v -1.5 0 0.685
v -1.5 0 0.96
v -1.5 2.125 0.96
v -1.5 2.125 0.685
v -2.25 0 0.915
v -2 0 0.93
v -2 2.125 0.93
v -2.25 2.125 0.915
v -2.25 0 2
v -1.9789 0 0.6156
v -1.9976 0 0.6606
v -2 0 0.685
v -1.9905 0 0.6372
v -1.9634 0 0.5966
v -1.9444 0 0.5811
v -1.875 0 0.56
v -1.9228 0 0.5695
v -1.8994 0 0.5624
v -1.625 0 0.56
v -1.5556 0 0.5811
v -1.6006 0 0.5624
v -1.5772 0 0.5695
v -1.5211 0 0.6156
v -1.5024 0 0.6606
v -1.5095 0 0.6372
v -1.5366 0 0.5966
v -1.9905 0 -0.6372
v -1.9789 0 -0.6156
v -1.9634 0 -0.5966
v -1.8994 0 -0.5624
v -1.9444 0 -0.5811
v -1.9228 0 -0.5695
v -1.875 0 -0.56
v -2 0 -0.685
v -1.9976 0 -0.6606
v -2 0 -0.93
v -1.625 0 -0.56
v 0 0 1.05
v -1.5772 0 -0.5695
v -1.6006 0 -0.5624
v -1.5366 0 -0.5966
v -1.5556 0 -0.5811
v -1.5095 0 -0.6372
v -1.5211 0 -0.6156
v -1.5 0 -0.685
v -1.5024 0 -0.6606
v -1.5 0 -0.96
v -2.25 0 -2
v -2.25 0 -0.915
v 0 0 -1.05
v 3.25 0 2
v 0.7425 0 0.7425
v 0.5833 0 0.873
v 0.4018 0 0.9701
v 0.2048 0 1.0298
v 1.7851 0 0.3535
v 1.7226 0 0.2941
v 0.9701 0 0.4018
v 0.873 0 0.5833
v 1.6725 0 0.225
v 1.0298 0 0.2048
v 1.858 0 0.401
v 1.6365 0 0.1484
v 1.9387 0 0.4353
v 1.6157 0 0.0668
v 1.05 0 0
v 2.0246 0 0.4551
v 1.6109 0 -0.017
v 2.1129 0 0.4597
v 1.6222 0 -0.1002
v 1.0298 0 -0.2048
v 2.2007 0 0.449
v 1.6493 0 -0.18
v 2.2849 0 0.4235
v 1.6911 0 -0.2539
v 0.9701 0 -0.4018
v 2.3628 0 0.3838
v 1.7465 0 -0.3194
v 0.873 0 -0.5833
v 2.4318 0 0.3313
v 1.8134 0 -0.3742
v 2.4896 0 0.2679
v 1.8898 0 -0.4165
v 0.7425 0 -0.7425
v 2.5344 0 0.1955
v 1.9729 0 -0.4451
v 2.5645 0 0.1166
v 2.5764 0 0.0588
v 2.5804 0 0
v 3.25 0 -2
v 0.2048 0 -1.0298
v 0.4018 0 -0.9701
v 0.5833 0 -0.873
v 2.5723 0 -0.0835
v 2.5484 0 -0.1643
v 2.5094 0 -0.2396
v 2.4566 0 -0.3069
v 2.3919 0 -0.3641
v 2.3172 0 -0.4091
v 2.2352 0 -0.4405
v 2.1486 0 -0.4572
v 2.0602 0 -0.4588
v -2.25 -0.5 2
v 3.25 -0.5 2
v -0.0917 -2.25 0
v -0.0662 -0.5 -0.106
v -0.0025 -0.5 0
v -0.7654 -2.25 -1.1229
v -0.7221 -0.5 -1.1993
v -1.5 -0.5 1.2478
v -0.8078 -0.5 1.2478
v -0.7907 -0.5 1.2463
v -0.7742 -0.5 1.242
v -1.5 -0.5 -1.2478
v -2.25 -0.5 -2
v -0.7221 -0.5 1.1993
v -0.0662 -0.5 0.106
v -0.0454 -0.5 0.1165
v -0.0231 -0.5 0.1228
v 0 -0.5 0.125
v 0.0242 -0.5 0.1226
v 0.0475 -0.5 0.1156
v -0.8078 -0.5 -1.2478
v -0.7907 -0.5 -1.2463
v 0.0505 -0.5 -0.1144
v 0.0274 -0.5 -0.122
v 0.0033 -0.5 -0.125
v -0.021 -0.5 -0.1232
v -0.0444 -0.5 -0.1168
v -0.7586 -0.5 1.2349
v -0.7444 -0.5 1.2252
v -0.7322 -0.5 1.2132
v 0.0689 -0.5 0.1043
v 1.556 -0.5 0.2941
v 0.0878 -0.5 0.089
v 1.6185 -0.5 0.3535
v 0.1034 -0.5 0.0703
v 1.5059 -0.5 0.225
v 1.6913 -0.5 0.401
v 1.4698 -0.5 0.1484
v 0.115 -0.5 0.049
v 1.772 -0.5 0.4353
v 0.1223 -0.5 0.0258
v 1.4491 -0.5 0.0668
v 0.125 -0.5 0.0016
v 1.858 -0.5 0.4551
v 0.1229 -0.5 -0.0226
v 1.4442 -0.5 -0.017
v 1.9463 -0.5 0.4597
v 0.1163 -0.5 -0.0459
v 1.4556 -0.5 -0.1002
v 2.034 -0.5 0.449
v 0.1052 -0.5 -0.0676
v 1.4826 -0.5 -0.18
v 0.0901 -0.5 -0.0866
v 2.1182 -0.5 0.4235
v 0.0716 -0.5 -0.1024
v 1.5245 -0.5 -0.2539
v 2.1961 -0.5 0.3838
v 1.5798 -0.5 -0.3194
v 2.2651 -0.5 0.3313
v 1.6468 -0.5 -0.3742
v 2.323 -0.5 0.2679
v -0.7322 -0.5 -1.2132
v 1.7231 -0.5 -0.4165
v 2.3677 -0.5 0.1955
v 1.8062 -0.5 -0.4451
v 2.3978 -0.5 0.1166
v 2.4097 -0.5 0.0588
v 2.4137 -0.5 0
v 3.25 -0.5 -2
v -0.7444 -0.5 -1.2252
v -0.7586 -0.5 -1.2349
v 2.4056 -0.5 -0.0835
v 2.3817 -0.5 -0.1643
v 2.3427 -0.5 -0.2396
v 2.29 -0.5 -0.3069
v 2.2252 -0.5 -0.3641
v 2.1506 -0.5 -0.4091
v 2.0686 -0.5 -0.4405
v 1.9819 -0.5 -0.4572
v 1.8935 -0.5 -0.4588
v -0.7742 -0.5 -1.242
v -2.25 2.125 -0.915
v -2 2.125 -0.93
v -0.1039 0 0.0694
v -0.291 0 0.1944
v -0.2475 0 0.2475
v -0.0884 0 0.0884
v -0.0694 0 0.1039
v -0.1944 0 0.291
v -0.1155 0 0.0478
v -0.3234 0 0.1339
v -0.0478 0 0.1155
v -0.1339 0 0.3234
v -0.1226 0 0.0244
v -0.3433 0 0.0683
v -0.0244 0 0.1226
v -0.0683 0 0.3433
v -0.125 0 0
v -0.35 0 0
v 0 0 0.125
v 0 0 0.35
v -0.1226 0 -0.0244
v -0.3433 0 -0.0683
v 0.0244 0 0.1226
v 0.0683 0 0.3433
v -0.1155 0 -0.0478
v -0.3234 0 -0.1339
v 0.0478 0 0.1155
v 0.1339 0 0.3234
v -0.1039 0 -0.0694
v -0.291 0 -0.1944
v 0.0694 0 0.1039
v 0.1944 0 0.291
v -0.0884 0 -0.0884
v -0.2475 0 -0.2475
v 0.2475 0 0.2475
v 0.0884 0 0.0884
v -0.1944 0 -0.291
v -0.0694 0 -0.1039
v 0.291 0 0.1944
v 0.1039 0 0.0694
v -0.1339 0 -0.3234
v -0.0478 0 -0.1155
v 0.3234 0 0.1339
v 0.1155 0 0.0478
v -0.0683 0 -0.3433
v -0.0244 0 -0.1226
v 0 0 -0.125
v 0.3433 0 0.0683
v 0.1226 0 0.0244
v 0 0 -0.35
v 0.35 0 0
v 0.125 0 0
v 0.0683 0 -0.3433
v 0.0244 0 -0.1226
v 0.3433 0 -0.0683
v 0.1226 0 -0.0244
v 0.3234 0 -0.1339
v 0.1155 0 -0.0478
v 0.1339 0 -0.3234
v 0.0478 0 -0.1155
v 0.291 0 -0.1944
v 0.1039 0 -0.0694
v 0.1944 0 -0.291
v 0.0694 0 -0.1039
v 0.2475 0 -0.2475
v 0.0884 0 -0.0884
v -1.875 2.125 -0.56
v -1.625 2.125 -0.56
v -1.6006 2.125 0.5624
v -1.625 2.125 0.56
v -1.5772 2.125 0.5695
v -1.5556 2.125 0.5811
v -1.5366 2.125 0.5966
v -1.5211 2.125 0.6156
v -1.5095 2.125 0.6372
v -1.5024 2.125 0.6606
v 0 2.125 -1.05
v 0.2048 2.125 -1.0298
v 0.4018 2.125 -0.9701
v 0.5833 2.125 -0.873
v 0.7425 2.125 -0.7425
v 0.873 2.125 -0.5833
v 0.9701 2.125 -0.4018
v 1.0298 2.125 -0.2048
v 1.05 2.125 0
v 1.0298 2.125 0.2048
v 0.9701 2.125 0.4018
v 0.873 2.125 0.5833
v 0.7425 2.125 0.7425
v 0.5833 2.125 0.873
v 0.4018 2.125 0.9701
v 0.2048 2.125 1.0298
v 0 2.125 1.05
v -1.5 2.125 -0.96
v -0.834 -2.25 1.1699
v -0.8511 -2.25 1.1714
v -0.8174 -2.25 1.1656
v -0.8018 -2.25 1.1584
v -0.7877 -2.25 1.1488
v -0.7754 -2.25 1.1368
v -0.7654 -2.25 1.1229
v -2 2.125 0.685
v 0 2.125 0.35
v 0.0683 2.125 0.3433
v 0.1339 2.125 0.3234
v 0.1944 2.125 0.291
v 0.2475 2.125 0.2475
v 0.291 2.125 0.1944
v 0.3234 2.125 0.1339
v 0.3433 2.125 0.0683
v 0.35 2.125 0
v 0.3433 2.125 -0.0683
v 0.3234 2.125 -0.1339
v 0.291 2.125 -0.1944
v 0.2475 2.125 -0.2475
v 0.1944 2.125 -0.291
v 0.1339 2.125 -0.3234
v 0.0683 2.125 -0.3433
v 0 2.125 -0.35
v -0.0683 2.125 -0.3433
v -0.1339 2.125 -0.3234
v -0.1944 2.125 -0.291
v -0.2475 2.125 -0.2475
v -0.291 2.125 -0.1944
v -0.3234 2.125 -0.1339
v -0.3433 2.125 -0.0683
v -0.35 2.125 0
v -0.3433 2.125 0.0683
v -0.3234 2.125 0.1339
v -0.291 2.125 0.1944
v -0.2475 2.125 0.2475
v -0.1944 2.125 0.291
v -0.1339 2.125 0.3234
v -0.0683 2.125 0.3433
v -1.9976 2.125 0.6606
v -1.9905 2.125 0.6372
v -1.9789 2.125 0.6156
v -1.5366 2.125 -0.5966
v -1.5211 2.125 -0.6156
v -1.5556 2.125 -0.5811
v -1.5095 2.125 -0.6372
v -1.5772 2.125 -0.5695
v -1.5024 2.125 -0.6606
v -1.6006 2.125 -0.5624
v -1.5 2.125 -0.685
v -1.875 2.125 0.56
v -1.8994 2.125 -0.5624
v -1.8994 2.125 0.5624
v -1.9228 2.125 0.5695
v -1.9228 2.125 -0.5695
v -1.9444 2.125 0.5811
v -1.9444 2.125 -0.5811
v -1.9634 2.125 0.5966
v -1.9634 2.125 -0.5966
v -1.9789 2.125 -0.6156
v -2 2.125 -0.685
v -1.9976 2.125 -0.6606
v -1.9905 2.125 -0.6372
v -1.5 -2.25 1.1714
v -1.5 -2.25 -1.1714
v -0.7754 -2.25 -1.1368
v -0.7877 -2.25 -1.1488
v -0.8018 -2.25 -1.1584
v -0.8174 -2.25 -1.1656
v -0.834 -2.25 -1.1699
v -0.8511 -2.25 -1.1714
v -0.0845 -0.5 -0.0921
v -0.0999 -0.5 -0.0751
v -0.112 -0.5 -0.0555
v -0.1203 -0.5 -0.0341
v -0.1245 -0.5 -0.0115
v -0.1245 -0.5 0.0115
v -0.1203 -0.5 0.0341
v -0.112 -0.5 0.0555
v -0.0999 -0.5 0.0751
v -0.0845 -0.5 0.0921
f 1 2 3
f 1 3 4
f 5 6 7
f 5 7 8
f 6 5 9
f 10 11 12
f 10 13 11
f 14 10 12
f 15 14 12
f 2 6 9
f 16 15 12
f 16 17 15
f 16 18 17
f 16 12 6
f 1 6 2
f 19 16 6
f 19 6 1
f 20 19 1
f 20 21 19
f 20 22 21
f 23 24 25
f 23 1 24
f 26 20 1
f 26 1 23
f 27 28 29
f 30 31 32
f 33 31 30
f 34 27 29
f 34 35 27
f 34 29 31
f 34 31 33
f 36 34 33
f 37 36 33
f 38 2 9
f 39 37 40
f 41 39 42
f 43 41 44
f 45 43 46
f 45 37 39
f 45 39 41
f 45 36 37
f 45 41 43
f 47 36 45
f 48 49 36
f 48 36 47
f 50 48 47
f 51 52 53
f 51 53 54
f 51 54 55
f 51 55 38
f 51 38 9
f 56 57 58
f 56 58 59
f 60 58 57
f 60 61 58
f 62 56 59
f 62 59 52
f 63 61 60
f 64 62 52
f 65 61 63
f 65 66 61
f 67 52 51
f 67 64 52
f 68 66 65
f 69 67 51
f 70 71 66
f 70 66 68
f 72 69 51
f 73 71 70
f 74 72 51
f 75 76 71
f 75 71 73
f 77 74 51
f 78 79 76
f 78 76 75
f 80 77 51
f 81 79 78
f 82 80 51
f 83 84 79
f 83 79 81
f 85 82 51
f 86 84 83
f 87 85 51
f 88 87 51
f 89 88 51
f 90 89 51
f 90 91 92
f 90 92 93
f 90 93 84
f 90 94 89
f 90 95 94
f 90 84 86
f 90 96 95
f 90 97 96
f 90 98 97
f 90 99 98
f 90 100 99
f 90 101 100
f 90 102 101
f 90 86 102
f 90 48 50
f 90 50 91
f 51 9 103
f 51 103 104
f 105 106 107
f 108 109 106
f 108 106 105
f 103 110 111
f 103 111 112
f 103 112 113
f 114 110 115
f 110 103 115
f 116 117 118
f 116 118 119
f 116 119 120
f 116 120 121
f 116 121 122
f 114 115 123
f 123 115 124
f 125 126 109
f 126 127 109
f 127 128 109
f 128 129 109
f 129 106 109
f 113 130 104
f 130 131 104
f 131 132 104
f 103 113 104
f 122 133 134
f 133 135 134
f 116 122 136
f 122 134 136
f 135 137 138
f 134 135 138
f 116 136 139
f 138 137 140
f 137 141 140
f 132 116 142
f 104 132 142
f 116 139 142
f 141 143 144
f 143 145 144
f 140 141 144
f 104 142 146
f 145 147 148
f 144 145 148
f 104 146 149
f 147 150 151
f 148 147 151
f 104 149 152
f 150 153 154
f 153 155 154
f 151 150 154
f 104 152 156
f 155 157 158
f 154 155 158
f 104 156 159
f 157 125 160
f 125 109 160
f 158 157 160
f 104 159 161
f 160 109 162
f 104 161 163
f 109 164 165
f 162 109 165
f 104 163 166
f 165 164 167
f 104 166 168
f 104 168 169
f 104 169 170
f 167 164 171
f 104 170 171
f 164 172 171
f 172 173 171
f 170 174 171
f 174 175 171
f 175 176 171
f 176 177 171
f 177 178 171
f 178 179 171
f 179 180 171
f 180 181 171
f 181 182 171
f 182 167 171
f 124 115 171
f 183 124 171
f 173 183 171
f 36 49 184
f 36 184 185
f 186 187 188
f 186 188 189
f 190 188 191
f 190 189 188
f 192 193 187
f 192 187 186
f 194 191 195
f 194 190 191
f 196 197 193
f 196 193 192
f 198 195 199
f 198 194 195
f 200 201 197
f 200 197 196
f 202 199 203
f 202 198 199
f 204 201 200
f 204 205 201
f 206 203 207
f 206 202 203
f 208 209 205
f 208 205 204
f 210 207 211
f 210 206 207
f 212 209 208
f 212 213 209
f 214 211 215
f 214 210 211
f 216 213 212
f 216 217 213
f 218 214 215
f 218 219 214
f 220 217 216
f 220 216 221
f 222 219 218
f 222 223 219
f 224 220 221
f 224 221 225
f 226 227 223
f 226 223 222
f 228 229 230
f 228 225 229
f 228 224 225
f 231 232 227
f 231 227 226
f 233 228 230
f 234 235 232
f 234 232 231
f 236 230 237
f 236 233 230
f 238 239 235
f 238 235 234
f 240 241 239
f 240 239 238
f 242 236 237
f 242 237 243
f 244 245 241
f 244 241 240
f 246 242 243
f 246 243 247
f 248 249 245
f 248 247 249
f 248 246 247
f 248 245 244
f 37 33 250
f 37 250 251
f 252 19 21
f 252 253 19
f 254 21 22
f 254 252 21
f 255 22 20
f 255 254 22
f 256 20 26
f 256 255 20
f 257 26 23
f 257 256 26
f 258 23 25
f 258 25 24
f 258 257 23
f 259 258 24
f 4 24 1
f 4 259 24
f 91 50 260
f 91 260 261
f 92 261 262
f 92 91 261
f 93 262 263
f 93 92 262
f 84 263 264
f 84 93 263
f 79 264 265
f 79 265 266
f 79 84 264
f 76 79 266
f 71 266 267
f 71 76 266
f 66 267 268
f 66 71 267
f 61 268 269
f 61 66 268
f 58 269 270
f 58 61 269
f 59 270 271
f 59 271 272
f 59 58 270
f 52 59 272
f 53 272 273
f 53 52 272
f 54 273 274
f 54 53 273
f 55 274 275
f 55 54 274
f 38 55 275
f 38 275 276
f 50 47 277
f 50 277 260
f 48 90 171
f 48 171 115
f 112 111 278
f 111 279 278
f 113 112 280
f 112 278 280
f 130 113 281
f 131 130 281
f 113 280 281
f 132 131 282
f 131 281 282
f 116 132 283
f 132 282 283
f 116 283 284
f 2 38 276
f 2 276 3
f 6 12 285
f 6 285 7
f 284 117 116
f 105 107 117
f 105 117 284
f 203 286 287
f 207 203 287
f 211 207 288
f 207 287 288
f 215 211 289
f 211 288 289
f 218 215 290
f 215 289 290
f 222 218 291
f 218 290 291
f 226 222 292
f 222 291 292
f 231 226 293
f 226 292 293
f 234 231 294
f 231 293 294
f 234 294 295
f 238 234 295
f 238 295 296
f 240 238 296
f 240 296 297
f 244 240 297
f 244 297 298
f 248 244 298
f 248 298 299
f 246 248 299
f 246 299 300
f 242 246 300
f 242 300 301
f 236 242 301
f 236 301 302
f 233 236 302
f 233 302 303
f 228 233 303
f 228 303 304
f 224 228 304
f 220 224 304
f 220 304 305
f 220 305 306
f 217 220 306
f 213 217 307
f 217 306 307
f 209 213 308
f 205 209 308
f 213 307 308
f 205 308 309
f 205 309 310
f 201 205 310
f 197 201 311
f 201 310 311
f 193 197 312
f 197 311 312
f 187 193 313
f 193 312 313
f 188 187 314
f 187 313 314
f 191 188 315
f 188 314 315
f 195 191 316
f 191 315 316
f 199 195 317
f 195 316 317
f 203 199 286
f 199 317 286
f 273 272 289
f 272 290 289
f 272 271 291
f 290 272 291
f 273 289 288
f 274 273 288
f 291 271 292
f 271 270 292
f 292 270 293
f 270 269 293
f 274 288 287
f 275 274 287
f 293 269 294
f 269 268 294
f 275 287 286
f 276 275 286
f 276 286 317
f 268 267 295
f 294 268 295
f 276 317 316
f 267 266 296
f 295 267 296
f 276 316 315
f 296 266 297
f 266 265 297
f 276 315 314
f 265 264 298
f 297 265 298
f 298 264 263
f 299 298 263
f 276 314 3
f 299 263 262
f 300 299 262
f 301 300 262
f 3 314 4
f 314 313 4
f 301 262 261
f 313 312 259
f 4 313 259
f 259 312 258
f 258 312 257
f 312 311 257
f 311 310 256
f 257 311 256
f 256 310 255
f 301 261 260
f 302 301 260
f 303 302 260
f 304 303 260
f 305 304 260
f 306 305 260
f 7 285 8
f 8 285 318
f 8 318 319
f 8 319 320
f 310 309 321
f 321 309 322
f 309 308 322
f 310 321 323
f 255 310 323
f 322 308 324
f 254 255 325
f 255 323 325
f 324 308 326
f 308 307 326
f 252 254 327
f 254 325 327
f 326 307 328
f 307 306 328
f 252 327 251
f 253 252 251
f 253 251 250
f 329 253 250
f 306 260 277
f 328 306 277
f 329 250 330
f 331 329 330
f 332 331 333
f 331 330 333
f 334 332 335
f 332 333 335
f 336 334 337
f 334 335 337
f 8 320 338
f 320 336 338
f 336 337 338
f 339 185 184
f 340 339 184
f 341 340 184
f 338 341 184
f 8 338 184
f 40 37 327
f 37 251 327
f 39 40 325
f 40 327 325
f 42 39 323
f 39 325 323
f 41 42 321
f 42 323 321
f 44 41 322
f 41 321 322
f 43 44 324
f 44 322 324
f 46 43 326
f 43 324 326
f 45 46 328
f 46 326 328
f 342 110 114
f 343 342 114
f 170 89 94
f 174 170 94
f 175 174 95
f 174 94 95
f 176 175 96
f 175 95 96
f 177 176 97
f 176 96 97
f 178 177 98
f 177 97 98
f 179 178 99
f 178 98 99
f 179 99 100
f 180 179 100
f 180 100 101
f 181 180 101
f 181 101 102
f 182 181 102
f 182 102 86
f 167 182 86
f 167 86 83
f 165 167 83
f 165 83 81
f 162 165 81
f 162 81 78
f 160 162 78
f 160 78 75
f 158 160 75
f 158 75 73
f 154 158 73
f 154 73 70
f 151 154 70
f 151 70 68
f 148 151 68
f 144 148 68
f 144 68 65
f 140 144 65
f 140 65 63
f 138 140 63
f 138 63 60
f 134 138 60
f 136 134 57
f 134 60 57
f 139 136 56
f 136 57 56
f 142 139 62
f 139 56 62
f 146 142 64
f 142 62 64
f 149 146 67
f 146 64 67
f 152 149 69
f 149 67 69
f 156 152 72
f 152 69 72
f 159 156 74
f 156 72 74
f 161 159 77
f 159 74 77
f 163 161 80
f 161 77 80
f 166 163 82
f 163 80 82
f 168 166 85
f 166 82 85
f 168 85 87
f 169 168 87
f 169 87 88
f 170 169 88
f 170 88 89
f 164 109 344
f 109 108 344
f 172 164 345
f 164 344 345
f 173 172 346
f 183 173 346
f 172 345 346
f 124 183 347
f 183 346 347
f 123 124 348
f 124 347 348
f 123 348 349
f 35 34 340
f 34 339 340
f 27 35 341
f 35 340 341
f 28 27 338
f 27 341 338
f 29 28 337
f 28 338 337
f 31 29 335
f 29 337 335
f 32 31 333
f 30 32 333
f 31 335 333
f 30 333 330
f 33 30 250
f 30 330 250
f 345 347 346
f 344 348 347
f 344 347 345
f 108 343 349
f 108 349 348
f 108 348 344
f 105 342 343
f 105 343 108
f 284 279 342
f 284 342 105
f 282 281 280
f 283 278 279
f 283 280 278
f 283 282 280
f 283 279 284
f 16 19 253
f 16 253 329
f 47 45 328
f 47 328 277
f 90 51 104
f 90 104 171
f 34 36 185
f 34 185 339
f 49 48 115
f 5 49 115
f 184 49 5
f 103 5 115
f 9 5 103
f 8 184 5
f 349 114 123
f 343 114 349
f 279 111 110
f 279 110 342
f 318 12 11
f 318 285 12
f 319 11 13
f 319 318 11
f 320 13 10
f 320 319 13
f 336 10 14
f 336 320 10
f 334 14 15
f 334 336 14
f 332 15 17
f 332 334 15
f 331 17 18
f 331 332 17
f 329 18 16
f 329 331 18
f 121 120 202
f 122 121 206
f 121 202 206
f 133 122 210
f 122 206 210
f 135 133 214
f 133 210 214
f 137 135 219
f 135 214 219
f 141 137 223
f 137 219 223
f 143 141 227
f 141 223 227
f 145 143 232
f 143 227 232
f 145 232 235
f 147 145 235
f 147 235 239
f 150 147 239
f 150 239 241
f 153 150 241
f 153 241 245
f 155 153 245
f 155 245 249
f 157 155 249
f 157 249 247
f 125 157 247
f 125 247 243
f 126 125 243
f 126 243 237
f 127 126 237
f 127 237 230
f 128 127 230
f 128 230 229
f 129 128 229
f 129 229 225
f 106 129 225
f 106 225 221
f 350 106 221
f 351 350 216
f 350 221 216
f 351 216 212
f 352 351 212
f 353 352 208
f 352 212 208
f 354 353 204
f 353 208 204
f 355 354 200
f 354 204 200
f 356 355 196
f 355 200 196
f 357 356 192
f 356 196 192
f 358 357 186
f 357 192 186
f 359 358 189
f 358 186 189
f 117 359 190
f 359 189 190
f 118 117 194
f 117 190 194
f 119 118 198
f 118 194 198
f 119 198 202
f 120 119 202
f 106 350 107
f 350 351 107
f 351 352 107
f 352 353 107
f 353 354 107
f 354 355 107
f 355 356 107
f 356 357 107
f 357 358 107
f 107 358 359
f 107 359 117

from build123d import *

# Parameters (mm, degrees)
BOSS_EXTRUDE1_DEPTH     = 2.125
SKETCH4_R               = 0.35
THROUGH_HOLES_DEPTH     = 4.445014514
FILLET1_R               = 0.125
SKETCH5_R               = 0.125
BOSS_EXTRUDE2_DEPTH     = 0.5
SKETCH8_R               = 0.46
CUT_EXTRUDE1_DEPTH      = 5.582575695
CUT_EXTRUDE2_DEPTH      = 5.367851302
CUT_EXTRUDE2_DEPTH_BACK = 5.367851302
SKETCH9_W               = 1.465031661
SKETCH9_H               = 4
BOSS_EXTRUDE3_DEPTH     = 1.75
CHAMFER1_SIZE           = 1.8
CHAMFER1_SIZE_2         = 0.078589697
FILLET2_R               = 0.1


with BuildPart() as part:
    # Sketch3 → Boss-Extrude1 (new body)
    with BuildSketch(Plane(origin=(0, 0, 0), x_dir=(1, 0, 0), z_dir=(0, 1, 0))):
        with BuildLine():
            Line((-2.5, 0.9), (-2, 0.93))
            Line((-2, 0.93), (-2, 0.56))
            Line((-2, 0.56), (-1.5, 0.56))
            Line((-1.5, 0.56), (-1.5, 0.96))
            Line((-1.5, 0.96), (0, 1.05))
            ThreePointArc((0, 1.05), (1.05, 0), (0, -1.05))
            Line((0, -1.05), (-1.5, -0.96))
            Line((-1.5, -0.96), (-1.5, -0.56))
            Line((-1.5, -0.56), (-2, -0.56))
            Line((-2, -0.56), (-2, -0.93))
            Line((-2, -0.93), (-2.5, -0.9))
            Line((-2.5, -0.9), (-2.5, 0.9))
        make_face()
    extrude(amount=BOSS_EXTRUDE1_DEPTH)

    # Sketch4 → Through Holes (cut, through all)
    with BuildSketch(Plane(origin=(0, 2.125, 0), x_dir=(1, 0, 0), z_dir=(0, 1, 0))):
        with Locations(Location((0, 0, 0), (0, 0, 270))):
            Circle(SKETCH4_R)
    extrude(amount=-THROUGH_HOLES_DEPTH, mode=Mode.SUBTRACT)

    # Fillet1
    fillet1_edges = [part.edges().sort_by_distance(p)[0] for p in [
        (-2, 1.0625, -0.56),
        (-1.5, 1.0625, -0.56),
        (-1.5, 1.0625, 0.56),
        (-2, 1.0625, 0.56),
    ]]
    fillet(fillet1_edges, radius=FILLET1_R)

    # Sketch5 → Boss-Extrude2 (add)
    with BuildSketch(Plane(origin=(0, 0, 0), x_dir=(1, 0, 0), z_dir=(0, 1, 0))):
        Polygon((-2.25, -2), (1.75, -2), (3.25, -2), (3.25, 2), (1.75, 2), (-2.25, 2), align=None)
        with Locations(Location((0, 0, 0), (0, 0, 270))):
            Circle(SKETCH5_R, mode=Mode.SUBTRACT)
    extrude(amount=-BOSS_EXTRUDE2_DEPTH)

    # Sketch8 → Cut-Extrude1 (cut, through all)
    with BuildSketch(Plane(origin=(0.7, 2.1, 0), x_dir=(0.948683298050514, -0.3162277660168378, 0), z_dir=(0.3162277660168378, 0.948683298050514, 0))):
        with Locations((1.987936011, 0)):
            Circle(SKETCH8_R)
    extrude(amount=-CUT_EXTRUDE1_DEPTH, mode=Mode.SUBTRACT)

    # Sketch9 → Cut-Extrude2 (cut, two sides: drawn at the far end of the back side and taken through both)
    with BuildSketch(Plane.XZ.offset(-CUT_EXTRUDE2_DEPTH_BACK)):
        with Locations((-2.982515831, 0)):
            Rectangle(SKETCH9_W, SKETCH9_H)
    extrude(amount=CUT_EXTRUDE2_DEPTH + CUT_EXTRUDE2_DEPTH_BACK, mode=Mode.SUBTRACT)

    # Sketch10 → Boss-Extrude3 (add)
    with BuildSketch(Plane.XZ.offset(0.5)):
        Polygon((-1.5, 1.25), (-1.5, -1.25), (-0.75, -1.25), (0, 0), (-0.75, 1.25), align=None)
    extrude(amount=BOSS_EXTRUDE3_DEPTH)

    # Chamfer1
    # the kernel refuses this chamfer: 1.8, 0.078589697 mm, written as the material it takes off along each edge
    with BuildSketch(Plane(origin=(-6.179835266, -2.25, -1.25), x_dir=(0, 0.999998592613724, -0.0016777278000430623), z_dir=(1, 0, 0))) as chamfer1_piece_1_section:
        Polygon((CHAMFER1_SIZE * 0.999998592614, CHAMFER1_SIZE * 0.00167772780004), (-CHAMFER1_SIZE_2 * 0.00167772780507, CHAMFER1_SIZE_2 * 0.999998595608), (0, 0), align=None)
    chamfer1_piece_1 = extrude(amount=10.109670532, mode=Mode.PRIVATE)
    chamfer1_piece_1 = split(chamfer1_piece_1, bisect_by=Plane(origin=(-1.125, -0.5, -1.243941513), z_dir=(0, -1, 0)), keep=Keep.TOP, mode=Mode.PRIVATE)
    add(chamfer1_piece_1, mode=Mode.SUBTRACT)
    with BuildSketch(Plane(origin=(-3.157755381, -2.25, -5.262925634), x_dir=(0.0014386397198082417, 0.9999985926137243, -0.0008631838318849449), z_dir=(0.5144957554275265, 0, 0.8574929257125442))) as chamfer1_piece_2_section:
        Polygon((CHAMFER1_SIZE * 0.999998592614, CHAMFER1_SIZE * 0.00167772780004), (-CHAMFER1_SIZE_2 * 0.00167772780507, CHAMFER1_SIZE_2 * 0.999998595608), (0, 0), align=None)
    chamfer1_piece_2 = extrude(amount=10.817408506, mode=Mode.PRIVATE)
    chamfer1_piece_2 = split(chamfer1_piece_2, bisect_by=Plane(origin=(-0.38019511, -0.5, -0.621882934), z_dir=(0, -1, 0)), keep=Keep.TOP, mode=Mode.PRIVATE)
    add(chamfer1_piece_2, mode=Mode.SUBTRACT)
    with BuildSketch(Plane(origin=(2.407755381, -2.25, -4.012925634), x_dir=(0.0014386397198082065, 0.9999985926137243, 0.0008631838318849242), z_dir=(-0.5144957554275267, 0, 0.8574929257125442))) as chamfer1_piece_3_section:
        Polygon((CHAMFER1_SIZE * 0.999998592614, CHAMFER1_SIZE * 0.00167772780004), (-CHAMFER1_SIZE_2 * 0.00167772780507, CHAMFER1_SIZE_2 * 0.999998595608), (0, 0), align=None)
    chamfer1_piece_3 = extrude(amount=10.817408506, mode=Mode.PRIVATE)
    chamfer1_piece_3 = split(chamfer1_piece_3, bisect_by=Plane(origin=(-0.38019511, -0.5, 0.621882934), z_dir=(0, -1, 0)), keep=Keep.TOP, mode=Mode.PRIVATE)
    add(chamfer1_piece_3, mode=Mode.SUBTRACT)
    with BuildSketch(Plane(origin=(3.929835266, -2.25, 1.25), x_dir=(0, 0.999998592613724, 0.0016777278000430623), z_dir=(-1, 0, 0))) as chamfer1_piece_4_section:
        Polygon((CHAMFER1_SIZE * 0.999998592614, CHAMFER1_SIZE * 0.00167772780004), (-CHAMFER1_SIZE_2 * 0.00167772780507, CHAMFER1_SIZE_2 * 0.999998595608), (0, 0), align=None)
    chamfer1_piece_4 = extrude(amount=10.109670532, mode=Mode.PRIVATE)
    chamfer1_piece_4 = split(chamfer1_piece_4, bisect_by=Plane(origin=(-1.125, -0.5, 1.243941513), z_dir=(0, -1, 0)), keep=Keep.TOP, mode=Mode.PRIVATE)
    add(chamfer1_piece_4, mode=Mode.SUBTRACT)

    # Fillet2
    fillet2_edges = [part.edges().sort_by_distance(p)[0] for p in [
        (-0.772866375, -1.375, 1.209613628),
        (-0.772866375, -1.375, -1.209613628),
    ]]
    fillet(fillet2_edges, radius=FILLET2_R)


solid = part.part
